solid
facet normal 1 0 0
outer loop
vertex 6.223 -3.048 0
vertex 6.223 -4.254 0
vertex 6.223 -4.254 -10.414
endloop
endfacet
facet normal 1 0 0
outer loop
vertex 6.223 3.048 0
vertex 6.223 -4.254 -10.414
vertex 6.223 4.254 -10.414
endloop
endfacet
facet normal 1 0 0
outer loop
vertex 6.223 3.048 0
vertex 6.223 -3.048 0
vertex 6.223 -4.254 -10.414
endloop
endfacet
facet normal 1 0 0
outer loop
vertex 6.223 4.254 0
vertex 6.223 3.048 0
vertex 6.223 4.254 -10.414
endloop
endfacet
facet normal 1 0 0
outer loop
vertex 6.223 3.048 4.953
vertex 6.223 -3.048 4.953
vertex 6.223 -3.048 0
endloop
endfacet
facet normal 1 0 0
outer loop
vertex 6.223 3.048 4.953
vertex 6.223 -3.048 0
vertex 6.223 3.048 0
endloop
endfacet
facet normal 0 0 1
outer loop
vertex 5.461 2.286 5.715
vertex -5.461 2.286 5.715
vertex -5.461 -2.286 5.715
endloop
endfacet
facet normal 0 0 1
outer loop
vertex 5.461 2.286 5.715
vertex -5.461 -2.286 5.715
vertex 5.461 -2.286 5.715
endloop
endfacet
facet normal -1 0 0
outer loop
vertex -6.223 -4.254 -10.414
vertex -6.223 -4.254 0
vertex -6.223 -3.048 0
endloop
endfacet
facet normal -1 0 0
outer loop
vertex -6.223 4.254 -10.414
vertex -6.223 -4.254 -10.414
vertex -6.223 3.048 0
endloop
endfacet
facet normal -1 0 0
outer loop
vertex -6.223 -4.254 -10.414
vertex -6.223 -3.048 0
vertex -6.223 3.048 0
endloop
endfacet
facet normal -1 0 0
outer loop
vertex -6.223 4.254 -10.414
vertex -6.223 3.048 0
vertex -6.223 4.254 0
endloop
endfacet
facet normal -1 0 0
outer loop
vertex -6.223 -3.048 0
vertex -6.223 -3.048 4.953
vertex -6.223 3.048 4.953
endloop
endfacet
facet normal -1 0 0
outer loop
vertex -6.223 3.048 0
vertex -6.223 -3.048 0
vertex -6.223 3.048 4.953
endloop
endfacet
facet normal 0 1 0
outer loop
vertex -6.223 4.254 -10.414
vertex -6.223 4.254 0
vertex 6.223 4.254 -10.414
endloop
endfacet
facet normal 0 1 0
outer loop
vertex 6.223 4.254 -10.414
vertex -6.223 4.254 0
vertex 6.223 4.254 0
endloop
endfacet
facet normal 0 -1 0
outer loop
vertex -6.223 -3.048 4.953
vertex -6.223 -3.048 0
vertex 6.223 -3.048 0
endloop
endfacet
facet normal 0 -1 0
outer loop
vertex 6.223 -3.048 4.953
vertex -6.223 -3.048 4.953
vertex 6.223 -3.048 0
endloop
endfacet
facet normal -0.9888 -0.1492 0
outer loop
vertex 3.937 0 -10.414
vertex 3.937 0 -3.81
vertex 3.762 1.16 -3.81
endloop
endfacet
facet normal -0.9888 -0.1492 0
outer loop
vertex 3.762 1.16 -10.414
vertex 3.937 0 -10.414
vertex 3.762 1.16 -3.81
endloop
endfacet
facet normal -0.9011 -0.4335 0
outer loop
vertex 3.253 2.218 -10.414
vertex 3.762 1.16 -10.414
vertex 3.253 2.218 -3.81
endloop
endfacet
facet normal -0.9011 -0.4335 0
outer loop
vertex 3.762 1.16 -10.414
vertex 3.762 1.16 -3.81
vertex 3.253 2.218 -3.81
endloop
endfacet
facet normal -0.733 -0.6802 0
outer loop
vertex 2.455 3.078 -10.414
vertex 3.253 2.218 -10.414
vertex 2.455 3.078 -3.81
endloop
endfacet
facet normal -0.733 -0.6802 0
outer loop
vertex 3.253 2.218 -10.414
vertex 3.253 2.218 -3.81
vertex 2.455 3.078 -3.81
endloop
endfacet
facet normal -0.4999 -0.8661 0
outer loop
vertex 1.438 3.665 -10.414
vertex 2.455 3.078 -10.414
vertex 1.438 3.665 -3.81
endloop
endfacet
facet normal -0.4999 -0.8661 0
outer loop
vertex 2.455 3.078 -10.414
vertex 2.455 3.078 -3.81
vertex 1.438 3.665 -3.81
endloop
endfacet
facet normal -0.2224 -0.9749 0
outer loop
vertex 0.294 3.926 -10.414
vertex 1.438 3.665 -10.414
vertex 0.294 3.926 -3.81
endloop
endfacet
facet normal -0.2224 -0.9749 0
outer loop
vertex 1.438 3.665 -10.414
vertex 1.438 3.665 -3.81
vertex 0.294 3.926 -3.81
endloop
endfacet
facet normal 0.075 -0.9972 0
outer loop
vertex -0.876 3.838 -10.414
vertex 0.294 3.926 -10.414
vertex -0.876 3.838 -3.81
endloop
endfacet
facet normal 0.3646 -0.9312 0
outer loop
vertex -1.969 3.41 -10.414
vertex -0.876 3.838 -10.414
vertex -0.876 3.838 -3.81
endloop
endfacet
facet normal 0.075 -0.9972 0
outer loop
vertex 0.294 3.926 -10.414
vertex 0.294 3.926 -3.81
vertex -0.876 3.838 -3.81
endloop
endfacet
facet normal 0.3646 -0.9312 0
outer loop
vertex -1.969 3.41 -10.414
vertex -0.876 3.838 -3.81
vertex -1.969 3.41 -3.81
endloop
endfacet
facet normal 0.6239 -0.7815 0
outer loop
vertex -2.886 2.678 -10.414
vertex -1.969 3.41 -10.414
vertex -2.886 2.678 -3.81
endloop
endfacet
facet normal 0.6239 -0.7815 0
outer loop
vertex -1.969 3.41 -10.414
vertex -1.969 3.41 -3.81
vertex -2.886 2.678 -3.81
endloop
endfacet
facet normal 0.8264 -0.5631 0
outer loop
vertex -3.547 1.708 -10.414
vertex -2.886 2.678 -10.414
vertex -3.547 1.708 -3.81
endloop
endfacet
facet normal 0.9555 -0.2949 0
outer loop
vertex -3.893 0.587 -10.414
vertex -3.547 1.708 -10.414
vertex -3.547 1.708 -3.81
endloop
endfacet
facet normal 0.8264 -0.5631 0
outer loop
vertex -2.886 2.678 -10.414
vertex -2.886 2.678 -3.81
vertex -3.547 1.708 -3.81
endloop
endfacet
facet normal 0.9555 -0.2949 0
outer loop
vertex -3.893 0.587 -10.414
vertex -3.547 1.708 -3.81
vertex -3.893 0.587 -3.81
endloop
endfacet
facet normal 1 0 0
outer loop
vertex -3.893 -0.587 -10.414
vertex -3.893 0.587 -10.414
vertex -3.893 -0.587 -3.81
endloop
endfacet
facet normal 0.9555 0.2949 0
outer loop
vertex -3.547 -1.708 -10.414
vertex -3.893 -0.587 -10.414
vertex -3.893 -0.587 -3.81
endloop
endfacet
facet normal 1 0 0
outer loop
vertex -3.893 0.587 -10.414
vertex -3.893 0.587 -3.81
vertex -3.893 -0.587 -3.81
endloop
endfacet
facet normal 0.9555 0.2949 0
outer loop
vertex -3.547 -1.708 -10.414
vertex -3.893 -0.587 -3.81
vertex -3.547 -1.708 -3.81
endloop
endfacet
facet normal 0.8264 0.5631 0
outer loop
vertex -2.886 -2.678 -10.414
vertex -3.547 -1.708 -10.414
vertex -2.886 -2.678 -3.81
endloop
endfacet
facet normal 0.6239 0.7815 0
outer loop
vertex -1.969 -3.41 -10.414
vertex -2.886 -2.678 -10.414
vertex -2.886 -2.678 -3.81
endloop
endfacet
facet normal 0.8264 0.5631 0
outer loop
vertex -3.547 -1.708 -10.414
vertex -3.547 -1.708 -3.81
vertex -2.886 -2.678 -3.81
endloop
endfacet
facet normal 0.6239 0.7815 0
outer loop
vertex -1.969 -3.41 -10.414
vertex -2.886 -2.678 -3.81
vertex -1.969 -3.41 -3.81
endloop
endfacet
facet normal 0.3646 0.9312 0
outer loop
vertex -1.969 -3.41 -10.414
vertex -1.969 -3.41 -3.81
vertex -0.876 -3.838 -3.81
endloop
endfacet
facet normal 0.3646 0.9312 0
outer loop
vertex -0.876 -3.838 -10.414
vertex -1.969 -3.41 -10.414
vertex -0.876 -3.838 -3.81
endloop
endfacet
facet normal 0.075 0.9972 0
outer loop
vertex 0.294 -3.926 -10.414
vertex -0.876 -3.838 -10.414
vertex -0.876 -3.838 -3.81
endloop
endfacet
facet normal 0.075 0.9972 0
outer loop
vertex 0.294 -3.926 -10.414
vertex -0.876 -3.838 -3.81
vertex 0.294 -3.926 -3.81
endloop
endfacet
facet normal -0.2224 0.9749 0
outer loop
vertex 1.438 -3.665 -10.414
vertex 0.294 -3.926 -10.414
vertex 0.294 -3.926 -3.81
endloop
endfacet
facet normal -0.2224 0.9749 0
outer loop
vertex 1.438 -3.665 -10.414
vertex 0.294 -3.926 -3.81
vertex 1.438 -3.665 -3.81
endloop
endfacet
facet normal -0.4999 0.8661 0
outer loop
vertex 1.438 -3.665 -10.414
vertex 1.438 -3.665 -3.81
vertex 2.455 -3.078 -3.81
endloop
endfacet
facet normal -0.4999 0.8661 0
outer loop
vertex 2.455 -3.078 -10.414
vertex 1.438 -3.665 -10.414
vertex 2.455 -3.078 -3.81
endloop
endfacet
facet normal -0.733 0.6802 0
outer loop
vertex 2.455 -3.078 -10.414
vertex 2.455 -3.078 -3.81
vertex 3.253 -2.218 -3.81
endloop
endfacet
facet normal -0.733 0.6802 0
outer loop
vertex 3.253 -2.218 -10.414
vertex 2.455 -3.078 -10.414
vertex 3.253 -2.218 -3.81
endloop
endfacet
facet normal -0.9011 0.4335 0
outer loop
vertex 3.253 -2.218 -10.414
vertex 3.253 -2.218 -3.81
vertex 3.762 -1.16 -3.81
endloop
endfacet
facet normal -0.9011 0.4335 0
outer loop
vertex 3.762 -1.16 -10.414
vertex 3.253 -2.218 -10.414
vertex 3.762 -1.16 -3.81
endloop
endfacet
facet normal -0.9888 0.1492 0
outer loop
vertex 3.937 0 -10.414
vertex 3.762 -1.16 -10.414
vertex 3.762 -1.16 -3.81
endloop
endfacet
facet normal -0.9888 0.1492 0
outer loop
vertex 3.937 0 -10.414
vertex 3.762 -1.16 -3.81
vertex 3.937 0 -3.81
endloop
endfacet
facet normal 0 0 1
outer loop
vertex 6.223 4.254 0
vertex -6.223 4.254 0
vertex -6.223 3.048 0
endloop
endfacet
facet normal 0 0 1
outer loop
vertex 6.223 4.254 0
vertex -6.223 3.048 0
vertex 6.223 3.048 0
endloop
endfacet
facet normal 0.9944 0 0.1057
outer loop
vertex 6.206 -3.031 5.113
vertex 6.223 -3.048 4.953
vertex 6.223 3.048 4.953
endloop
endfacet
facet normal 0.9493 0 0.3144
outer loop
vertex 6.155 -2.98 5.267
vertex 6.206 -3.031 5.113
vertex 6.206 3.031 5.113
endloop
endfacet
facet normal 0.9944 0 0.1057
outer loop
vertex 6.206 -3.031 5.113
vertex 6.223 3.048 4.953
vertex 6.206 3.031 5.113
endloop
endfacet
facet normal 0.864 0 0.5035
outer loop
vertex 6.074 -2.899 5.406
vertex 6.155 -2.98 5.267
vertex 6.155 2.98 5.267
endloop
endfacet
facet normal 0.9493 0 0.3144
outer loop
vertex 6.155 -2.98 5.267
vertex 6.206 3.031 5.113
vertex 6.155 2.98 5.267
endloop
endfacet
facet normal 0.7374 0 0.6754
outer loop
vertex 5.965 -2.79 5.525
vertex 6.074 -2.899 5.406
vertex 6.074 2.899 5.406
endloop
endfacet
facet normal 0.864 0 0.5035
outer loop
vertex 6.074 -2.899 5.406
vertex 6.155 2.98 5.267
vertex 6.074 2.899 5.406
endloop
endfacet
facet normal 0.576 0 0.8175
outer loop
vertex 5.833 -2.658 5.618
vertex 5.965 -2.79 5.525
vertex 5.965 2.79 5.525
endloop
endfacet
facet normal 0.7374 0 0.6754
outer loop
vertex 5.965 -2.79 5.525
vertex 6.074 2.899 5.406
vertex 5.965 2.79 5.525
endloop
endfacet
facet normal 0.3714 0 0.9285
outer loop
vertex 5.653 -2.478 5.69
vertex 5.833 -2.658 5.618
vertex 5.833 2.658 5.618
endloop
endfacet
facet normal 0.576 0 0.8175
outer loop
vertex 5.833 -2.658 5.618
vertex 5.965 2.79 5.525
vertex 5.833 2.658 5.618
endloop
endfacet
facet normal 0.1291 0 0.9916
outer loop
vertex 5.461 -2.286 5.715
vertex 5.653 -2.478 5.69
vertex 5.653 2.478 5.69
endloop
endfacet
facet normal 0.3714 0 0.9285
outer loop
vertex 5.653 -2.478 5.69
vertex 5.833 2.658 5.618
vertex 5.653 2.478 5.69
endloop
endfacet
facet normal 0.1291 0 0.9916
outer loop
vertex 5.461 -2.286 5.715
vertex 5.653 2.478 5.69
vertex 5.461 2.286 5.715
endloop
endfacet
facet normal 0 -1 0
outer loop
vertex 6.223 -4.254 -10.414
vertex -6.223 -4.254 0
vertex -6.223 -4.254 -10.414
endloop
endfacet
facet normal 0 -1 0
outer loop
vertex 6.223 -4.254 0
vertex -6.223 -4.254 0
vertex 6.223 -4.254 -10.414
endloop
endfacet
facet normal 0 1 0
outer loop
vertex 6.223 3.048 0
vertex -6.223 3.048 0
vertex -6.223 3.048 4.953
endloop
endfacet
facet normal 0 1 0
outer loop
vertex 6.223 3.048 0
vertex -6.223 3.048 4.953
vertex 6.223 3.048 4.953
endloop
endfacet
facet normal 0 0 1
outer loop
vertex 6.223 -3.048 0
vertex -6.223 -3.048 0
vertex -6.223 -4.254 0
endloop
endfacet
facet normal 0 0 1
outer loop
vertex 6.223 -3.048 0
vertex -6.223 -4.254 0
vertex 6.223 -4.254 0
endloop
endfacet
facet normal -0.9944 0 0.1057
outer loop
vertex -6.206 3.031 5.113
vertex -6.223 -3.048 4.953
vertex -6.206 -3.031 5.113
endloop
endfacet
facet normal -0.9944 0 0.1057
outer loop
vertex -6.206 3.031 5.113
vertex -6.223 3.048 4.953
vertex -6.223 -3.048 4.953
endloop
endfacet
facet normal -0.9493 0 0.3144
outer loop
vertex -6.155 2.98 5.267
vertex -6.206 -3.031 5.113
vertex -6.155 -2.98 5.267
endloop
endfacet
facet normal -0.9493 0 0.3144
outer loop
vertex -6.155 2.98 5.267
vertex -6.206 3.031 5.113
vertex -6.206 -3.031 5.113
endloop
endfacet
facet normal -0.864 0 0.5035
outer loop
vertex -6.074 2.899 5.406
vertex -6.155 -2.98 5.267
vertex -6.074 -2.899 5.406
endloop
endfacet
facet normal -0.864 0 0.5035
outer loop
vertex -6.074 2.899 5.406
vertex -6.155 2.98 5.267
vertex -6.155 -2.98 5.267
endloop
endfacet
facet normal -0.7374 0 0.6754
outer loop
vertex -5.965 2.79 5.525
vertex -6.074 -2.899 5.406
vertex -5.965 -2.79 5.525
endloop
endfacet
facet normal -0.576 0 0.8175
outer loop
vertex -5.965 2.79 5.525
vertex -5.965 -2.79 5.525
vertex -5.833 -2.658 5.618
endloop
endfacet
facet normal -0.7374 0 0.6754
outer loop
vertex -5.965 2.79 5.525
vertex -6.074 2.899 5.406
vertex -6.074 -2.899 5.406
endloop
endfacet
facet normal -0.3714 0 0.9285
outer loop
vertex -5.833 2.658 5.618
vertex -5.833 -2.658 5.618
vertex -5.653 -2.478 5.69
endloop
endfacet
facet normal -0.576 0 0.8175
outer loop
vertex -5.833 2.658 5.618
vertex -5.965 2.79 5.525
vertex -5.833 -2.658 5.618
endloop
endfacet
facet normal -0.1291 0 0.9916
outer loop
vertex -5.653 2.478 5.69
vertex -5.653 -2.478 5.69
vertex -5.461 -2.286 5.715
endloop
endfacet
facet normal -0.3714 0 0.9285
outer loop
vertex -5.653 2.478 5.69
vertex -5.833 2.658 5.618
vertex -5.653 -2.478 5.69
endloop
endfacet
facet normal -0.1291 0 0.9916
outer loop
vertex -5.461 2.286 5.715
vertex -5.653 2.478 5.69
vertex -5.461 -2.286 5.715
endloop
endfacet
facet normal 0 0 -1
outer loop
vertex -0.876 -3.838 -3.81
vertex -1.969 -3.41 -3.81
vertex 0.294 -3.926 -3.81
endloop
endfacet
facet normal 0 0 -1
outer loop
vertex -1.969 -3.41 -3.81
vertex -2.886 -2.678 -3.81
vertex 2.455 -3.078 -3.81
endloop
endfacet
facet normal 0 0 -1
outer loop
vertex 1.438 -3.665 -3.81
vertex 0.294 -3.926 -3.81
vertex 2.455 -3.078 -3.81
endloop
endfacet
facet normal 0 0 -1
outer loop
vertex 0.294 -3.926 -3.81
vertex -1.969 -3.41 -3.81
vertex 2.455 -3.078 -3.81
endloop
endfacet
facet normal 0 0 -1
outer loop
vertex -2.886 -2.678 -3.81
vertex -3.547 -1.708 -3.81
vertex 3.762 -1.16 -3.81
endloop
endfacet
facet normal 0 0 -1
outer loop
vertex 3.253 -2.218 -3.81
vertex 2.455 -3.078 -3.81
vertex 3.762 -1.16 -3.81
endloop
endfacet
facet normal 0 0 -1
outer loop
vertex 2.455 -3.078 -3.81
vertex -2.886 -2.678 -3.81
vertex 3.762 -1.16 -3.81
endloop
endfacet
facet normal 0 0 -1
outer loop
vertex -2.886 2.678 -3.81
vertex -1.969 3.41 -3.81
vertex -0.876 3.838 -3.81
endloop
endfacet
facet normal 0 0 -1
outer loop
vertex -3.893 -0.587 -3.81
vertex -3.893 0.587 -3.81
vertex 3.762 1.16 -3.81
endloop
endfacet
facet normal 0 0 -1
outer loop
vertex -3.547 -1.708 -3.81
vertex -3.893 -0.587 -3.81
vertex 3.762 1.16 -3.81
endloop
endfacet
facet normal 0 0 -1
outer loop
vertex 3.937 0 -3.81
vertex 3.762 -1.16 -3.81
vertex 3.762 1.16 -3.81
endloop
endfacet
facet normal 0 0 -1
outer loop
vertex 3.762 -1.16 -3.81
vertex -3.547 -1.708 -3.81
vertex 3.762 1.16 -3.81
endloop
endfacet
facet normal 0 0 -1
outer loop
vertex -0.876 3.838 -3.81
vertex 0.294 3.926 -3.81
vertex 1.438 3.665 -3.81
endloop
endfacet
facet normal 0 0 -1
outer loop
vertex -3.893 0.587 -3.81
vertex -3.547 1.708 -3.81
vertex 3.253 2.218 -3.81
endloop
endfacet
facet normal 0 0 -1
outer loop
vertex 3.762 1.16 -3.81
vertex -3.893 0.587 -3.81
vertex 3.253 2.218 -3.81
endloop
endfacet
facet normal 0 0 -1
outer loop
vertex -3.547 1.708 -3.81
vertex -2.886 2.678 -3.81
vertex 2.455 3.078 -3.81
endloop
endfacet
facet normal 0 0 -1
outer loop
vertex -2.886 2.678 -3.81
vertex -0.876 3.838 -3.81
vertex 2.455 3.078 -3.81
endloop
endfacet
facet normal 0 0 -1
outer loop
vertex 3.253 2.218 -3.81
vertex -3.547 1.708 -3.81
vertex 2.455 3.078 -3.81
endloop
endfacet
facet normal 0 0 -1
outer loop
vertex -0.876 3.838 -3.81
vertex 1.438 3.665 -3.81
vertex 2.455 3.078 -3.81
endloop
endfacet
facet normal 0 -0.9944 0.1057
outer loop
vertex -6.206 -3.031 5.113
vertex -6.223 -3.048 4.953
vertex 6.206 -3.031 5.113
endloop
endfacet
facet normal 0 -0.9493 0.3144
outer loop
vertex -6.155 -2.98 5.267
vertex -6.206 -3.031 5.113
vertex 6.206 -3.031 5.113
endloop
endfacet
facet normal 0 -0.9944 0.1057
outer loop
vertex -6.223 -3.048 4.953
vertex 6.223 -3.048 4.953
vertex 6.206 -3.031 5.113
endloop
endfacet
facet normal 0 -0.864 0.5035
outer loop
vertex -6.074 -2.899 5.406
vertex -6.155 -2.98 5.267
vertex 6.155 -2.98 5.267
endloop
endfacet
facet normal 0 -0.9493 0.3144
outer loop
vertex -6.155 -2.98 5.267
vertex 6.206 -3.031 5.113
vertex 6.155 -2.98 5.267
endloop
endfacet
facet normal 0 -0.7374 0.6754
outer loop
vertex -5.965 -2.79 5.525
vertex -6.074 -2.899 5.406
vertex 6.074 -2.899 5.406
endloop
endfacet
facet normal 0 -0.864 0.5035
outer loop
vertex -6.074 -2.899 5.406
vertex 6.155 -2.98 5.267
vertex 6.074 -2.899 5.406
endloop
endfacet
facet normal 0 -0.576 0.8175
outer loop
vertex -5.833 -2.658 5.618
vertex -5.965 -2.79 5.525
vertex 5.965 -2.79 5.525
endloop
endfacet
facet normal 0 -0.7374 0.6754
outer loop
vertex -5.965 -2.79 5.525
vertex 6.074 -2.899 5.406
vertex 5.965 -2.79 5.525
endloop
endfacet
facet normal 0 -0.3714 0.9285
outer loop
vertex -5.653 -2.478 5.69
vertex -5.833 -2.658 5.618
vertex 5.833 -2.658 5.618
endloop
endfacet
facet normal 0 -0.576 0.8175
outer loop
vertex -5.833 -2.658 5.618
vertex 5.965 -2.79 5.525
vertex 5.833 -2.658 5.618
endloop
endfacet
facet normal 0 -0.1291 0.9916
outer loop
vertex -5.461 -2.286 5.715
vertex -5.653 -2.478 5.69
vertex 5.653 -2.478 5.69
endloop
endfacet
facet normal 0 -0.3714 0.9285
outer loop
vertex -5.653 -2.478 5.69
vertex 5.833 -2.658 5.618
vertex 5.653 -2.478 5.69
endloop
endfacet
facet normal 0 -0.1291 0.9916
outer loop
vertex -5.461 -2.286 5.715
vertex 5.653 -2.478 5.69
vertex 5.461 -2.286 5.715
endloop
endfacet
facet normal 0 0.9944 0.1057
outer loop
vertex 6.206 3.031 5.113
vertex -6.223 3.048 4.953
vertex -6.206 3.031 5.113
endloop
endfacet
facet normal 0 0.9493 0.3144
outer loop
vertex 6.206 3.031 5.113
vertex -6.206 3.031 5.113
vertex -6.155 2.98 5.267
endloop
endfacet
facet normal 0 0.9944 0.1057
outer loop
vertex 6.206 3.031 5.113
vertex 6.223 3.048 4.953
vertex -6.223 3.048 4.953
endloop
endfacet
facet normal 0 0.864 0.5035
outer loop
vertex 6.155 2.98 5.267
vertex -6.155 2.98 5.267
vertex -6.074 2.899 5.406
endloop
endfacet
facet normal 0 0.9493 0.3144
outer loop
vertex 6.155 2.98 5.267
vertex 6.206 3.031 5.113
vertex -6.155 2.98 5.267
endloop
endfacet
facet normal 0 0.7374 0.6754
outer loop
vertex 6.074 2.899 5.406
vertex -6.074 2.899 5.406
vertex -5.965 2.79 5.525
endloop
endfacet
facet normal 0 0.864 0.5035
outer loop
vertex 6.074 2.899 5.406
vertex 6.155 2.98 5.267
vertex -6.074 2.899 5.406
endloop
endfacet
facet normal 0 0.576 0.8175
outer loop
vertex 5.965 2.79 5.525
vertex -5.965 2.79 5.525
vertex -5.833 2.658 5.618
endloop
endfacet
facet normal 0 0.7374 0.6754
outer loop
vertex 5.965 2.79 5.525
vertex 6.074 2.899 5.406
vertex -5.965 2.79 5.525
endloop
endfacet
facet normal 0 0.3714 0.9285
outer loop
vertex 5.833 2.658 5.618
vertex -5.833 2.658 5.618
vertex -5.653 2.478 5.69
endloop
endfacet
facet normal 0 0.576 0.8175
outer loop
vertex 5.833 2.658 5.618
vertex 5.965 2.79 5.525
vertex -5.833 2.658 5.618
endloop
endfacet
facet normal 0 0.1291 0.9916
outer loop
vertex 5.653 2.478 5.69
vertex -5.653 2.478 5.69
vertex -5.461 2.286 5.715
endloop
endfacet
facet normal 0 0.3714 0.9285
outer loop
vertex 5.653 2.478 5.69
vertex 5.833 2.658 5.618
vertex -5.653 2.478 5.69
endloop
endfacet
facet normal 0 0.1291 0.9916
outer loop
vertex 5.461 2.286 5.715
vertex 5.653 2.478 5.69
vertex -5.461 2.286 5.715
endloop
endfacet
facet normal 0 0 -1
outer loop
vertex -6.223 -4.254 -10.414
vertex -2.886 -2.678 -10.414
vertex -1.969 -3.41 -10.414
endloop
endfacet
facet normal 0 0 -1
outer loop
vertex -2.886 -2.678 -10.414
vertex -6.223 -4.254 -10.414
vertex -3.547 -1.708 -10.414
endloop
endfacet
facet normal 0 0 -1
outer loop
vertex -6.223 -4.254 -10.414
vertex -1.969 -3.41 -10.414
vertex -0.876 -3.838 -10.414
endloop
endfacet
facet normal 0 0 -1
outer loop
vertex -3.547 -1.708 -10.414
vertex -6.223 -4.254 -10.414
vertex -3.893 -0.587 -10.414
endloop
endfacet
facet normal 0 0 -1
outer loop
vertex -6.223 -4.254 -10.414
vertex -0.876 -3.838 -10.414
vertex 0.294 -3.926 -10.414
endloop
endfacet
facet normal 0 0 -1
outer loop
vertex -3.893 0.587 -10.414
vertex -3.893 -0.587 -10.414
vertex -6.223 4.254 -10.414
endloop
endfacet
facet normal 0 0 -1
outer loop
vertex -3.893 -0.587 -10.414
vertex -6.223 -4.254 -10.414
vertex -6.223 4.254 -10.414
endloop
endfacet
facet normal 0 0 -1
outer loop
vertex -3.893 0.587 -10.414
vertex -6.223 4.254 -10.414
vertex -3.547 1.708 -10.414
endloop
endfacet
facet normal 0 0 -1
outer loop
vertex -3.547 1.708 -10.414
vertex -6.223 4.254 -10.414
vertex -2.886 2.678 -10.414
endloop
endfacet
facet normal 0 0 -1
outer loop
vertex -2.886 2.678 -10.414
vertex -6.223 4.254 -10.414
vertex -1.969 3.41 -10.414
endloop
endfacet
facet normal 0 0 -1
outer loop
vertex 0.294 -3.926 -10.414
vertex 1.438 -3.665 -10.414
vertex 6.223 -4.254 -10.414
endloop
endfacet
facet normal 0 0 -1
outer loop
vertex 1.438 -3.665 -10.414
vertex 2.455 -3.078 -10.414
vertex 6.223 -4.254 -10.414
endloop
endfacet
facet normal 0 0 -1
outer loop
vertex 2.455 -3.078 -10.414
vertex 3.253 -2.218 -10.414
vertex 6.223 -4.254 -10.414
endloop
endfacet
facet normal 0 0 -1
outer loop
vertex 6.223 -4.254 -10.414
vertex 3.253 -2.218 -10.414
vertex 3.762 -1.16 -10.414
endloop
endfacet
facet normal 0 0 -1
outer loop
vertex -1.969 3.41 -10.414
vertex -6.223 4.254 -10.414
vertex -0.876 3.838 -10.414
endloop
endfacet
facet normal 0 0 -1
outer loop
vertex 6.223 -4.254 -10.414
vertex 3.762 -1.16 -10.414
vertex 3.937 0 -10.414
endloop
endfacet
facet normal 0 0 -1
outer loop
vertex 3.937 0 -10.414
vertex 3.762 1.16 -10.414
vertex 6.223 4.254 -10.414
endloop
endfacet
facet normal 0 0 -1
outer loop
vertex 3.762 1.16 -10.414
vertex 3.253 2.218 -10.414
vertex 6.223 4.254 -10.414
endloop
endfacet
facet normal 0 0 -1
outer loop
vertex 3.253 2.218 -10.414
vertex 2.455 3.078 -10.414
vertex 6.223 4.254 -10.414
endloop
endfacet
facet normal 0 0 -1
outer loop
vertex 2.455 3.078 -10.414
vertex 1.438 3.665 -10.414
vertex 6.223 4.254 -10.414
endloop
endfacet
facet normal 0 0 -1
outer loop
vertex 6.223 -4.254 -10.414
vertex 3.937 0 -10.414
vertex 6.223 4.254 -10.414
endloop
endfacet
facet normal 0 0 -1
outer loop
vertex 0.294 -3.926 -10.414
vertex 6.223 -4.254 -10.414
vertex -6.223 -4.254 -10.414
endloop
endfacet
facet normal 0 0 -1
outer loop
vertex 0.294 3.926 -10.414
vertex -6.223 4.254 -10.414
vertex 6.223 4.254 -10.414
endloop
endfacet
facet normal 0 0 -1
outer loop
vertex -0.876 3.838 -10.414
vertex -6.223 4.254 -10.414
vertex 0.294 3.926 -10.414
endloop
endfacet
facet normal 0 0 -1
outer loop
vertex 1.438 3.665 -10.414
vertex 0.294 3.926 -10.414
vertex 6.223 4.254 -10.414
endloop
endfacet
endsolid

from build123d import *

# Parameters (mm, degrees)
F0_W     = 12.446
F0_H     = 6.096
F1_DEPTH = 5.715
F2_W     = 12.446
F2_H     = 8.509
F3_DEPTH = 10.414
F4_R     = 0.762
F7_D     = 7.874
F7_DEPTH = 6.605


with BuildPart() as f1:
    # F0 (on Top) → F1 (new body)
    with BuildSketch(Plane.XY):
        Rectangle(F0_W, F0_H)
    extrude(amount=F1_DEPTH)

    # F2 (on Top) → F3 (join)
    with BuildSketch(Plane.XY):
        Rectangle(F2_W, F2_H)
    extrude(amount=-F3_DEPTH)

    # F4
    f4_edges = [f1.edges().sort_by_distance(p)[0] for p in [
        (6.223, 0, 5.715),
        (0, 3.048, 5.715),
        (-6.223, 0, 5.715),
        (0, -3.048, 5.715),
    ]]
    fillet(f4_edges, radius=F4_R)

    # F7 (through all, one way)
    with BuildSketch(Plane.XY.offset(-3.81)):
        with Locations((0, 0)):
            Circle(F7_D / 2)
    extrude(amount=-F7_DEPTH, mode=Mode.SUBTRACT)


solid = f1.part
